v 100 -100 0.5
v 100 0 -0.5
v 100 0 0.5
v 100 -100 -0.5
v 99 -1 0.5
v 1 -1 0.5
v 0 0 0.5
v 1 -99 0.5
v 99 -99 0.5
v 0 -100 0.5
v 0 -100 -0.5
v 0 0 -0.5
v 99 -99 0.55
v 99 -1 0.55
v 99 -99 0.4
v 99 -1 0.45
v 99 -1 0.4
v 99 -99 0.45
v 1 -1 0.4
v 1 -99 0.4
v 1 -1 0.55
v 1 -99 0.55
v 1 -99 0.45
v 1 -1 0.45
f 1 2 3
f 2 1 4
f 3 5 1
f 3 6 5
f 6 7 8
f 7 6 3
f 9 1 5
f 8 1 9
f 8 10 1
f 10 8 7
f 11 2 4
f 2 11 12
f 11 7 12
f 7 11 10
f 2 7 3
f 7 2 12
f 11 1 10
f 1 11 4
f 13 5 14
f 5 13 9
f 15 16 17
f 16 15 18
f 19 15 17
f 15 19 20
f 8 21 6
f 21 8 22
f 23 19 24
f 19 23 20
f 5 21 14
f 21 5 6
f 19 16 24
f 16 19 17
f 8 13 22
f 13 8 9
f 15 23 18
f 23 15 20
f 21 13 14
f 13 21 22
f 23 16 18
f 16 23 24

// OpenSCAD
module solar_tile(){
    color("#222"){
    translate([0,0,0.5]){
        cube([98,98,0.1],true);
    }
    }
    color("#888"){
    difference(){
        cube([100,100,1],true);
        translate([0,0,0.6]){
            cube([98,98,0.4],true);
        }
    }
    }
}

module solar_array(d){
//give diameter in milimetres
for(x=[-5E+3:100:5E+3]){
    for(y=[-5E+3:100:5E+3]){
        if(sqrt(pow(x,2)+pow(y,2))<(d-sqrt(2)*0.1E+3)/2){
            translate([x,y,0]){
                solar_tile();
            }
        }
    }
}
translate([0,0,-11]){color("#888"){
    cylinder(h=10,d=d,$fa=5);
}}
}

//actual things to render below


translate([50,-50,0]){
solar_tile();
}

$vpd=425;
$vpt=[50,-50,0];

//openscad ftt_solar_tile.scad -o ftt_solar_tile.png --view=axes,scales --colorscheme=Starnight --viewall --imgsize=1200,1000

/*
solar_array(10E+3);
$vpd=16E+3;
$vpt=[0,0,-1000];
*/
//openscad ftt_solar_tile.scad -o ftt_solar_tile.png --colorscheme=Starnight --viewall --imgsize=1000,500
